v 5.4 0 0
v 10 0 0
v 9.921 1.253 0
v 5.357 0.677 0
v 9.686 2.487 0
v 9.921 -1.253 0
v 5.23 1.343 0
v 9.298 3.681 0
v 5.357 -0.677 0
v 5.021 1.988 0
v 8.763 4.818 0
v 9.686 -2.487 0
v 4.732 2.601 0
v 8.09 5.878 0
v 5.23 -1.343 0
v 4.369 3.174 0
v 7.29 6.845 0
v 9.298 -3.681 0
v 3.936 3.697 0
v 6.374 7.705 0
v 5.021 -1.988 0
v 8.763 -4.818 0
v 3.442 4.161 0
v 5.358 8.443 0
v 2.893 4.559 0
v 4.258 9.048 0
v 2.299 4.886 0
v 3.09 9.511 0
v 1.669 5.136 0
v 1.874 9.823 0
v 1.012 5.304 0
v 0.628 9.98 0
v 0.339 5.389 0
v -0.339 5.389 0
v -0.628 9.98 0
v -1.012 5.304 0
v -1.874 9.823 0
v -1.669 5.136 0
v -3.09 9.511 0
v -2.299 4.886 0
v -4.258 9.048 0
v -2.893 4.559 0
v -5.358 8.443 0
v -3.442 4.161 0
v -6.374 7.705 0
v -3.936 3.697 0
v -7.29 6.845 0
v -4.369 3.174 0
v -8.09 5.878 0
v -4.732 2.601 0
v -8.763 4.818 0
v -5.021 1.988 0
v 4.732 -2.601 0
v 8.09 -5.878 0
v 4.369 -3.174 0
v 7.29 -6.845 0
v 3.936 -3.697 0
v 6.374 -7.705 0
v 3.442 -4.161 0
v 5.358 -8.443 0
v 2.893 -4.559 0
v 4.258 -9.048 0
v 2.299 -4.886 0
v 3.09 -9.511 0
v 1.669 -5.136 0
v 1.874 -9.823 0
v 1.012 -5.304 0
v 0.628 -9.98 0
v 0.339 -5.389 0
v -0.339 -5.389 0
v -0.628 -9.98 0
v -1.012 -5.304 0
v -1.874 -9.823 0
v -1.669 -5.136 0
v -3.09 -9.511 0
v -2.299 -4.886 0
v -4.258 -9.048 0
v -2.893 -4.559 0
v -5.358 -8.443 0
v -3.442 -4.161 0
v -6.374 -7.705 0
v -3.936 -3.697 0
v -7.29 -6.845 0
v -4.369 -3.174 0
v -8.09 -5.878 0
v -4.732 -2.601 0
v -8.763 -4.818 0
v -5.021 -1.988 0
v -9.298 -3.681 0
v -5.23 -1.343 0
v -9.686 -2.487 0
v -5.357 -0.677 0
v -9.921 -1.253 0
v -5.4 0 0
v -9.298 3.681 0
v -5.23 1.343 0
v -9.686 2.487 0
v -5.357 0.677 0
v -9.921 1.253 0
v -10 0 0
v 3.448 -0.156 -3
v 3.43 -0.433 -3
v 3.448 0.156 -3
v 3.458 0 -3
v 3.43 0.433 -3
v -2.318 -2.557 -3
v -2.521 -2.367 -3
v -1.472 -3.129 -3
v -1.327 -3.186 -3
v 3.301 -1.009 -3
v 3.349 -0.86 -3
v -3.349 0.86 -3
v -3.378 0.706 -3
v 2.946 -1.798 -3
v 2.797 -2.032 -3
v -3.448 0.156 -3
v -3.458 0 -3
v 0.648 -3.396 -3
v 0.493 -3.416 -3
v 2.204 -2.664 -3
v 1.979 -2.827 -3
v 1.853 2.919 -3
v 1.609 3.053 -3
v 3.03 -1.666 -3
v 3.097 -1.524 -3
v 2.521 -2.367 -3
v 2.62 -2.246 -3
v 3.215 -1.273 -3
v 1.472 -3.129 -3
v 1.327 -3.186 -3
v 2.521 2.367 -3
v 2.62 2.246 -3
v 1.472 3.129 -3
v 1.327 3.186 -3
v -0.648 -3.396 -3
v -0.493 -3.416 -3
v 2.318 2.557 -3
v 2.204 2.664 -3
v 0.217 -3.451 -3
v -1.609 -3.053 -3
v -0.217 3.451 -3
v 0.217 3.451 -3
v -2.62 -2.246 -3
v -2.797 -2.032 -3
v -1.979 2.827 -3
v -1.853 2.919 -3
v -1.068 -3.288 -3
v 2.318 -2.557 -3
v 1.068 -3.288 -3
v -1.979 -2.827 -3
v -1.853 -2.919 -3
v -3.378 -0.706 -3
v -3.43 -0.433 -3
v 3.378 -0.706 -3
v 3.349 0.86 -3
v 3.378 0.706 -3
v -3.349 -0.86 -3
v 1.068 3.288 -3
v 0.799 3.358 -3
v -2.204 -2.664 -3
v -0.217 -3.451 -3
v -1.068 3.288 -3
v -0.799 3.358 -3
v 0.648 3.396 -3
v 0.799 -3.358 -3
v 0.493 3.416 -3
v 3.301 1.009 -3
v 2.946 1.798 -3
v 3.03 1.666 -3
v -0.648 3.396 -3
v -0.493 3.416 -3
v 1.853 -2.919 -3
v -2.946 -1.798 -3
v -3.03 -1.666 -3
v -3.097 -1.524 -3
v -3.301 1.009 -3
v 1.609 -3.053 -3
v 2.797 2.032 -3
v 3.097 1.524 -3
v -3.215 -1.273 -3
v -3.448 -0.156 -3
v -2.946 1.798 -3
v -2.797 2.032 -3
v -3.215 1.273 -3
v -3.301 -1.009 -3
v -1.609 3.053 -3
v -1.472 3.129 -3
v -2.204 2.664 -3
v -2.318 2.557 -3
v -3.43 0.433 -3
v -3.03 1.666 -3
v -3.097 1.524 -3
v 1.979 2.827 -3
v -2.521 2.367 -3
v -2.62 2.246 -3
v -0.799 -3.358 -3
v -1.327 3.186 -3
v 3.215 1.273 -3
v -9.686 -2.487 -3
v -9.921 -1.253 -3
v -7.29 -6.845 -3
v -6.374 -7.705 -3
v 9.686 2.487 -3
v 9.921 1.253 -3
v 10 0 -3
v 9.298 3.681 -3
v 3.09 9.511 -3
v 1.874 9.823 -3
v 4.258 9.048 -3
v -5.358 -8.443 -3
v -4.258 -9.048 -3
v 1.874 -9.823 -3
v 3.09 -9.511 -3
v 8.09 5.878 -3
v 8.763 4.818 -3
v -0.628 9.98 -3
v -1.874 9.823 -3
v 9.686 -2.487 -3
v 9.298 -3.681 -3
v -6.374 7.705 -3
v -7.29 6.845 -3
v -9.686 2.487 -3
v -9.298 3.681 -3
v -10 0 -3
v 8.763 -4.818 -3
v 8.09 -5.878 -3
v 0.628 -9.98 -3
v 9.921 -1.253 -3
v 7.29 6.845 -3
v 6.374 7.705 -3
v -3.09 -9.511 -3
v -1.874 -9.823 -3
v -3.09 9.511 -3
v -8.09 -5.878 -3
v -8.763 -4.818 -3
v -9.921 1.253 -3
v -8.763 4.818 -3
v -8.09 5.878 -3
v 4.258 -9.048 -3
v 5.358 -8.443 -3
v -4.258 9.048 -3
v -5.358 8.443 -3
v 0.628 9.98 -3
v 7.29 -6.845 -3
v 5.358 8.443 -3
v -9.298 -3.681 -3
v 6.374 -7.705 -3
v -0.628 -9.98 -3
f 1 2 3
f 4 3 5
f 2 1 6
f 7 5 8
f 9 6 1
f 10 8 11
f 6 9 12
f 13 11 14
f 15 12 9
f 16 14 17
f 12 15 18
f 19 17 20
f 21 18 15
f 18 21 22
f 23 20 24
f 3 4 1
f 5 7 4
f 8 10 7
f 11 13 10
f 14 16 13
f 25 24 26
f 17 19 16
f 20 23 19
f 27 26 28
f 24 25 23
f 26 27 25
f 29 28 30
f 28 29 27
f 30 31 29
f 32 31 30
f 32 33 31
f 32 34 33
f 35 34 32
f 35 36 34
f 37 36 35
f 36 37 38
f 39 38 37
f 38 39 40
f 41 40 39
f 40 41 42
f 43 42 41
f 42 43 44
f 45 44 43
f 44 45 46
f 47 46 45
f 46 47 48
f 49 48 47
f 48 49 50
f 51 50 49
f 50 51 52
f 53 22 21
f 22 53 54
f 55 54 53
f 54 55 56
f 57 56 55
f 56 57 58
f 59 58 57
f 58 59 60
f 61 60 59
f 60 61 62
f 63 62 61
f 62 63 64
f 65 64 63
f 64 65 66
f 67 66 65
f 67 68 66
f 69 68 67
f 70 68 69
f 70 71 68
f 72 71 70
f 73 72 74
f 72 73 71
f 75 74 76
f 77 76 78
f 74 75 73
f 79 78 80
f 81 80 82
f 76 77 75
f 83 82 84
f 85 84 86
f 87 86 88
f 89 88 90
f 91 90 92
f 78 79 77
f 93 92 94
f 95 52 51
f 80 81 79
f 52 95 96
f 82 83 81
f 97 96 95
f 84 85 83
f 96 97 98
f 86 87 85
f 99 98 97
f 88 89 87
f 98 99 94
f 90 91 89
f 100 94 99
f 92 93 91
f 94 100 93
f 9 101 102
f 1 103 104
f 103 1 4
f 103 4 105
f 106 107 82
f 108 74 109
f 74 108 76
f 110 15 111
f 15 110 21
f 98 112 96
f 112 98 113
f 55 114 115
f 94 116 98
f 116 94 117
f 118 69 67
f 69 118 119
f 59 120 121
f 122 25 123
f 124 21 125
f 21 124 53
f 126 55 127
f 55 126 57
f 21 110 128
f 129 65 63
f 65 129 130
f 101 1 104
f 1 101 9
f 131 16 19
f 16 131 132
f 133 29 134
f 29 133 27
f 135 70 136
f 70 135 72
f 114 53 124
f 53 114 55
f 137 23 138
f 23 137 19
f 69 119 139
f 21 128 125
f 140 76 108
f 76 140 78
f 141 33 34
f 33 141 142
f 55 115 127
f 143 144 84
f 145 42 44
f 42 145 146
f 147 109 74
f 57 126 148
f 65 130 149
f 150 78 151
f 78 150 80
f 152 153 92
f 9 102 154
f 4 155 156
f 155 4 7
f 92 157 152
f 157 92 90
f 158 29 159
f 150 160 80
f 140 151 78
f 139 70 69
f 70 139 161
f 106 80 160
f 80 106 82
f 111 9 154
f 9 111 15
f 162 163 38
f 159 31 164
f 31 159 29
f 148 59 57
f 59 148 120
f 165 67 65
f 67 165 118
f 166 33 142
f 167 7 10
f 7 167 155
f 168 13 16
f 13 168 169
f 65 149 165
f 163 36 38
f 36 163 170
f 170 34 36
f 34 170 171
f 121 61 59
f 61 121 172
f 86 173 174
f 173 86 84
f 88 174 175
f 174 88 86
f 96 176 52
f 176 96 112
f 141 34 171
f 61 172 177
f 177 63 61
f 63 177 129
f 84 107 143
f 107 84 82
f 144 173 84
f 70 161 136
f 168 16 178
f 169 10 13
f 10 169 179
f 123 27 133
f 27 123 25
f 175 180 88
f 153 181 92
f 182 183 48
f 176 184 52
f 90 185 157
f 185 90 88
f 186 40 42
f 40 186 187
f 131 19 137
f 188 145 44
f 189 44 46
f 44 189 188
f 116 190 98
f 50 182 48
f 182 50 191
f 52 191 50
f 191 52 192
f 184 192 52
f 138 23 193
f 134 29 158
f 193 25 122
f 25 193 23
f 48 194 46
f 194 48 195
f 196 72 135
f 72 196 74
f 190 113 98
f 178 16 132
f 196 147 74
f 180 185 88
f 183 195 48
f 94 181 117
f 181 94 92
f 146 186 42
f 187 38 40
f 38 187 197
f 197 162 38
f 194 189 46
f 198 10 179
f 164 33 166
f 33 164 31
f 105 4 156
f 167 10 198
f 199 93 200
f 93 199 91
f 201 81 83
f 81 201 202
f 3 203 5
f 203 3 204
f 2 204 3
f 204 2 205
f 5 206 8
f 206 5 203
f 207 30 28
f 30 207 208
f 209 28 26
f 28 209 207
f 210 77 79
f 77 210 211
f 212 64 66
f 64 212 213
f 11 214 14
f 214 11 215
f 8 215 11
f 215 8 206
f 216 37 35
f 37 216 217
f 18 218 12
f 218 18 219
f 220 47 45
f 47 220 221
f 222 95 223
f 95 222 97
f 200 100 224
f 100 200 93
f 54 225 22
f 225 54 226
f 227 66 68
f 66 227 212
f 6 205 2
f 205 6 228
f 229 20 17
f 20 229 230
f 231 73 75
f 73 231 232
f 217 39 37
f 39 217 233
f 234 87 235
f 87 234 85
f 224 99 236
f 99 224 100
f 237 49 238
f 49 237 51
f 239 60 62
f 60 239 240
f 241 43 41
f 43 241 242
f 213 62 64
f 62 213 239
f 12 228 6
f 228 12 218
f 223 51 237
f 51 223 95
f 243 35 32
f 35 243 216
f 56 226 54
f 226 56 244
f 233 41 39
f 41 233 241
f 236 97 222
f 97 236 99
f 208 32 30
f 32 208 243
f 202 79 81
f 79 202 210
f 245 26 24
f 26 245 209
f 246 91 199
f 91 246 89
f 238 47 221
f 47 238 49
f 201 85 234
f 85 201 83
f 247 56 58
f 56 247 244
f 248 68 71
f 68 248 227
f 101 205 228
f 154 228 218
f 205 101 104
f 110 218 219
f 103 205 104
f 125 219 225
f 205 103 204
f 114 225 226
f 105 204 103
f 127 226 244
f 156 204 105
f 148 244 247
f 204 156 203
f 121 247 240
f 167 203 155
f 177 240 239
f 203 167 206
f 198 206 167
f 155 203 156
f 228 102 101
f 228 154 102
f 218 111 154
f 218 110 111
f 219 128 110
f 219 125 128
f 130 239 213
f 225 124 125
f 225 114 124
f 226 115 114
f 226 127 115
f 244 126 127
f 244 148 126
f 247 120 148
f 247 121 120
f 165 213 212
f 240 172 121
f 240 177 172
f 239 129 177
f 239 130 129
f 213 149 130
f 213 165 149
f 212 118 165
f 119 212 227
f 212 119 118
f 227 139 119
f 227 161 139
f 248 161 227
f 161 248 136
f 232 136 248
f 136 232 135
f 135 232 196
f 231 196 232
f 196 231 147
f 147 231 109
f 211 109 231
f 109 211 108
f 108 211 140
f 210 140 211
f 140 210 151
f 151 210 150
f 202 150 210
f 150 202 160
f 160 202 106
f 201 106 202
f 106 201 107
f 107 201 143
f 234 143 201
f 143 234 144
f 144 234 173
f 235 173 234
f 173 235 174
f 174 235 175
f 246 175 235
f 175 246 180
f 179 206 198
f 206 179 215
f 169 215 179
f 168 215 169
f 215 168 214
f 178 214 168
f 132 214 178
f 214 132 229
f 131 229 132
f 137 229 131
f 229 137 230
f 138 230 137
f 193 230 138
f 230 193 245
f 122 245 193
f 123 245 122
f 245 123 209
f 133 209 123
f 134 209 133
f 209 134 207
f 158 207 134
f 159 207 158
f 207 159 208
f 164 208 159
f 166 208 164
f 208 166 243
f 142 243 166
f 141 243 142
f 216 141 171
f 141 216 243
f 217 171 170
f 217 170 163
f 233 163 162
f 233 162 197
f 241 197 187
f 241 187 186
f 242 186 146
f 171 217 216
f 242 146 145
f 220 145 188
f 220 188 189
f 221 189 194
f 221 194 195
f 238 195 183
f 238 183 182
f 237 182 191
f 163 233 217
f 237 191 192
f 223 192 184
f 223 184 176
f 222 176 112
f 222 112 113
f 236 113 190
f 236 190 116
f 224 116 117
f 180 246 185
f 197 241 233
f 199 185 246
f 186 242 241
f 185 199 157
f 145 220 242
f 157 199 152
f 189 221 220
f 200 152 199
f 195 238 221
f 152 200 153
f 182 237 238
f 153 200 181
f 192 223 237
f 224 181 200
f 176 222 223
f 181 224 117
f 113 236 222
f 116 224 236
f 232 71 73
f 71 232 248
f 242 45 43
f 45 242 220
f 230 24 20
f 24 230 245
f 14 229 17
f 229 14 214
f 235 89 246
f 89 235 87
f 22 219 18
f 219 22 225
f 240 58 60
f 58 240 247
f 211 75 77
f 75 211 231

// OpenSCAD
$fn = 50;

difference() {
	union() {
		translate(v = [0, 0, -3.0]) {
			cylinder(h = 3, r = 10.0);
		}
	}
	union() {
		translate(v = [0, 0, 0]) {
			rotate(a = [0, 0, 0]) {
				difference() {
					union() {
						translate(v = [0, 0, -6.0]) {
							cylinder(h = 6, r = 2.6);
						}
						translate(v = [0, 0, -3.9]) {
							cylinder(h = 3.9, r1 = 2.875, r2 = 5.4);
						}
						translate(v = [0, 0, -6.0]) {
							cylinder(h = 6, r = 2.875);
						}
						translate(v = [0, 0, -6.0]) {
							cylinder(h = 6, r = 2.6);
						}
					}
					union();
				}
			}
		}
	}
}
